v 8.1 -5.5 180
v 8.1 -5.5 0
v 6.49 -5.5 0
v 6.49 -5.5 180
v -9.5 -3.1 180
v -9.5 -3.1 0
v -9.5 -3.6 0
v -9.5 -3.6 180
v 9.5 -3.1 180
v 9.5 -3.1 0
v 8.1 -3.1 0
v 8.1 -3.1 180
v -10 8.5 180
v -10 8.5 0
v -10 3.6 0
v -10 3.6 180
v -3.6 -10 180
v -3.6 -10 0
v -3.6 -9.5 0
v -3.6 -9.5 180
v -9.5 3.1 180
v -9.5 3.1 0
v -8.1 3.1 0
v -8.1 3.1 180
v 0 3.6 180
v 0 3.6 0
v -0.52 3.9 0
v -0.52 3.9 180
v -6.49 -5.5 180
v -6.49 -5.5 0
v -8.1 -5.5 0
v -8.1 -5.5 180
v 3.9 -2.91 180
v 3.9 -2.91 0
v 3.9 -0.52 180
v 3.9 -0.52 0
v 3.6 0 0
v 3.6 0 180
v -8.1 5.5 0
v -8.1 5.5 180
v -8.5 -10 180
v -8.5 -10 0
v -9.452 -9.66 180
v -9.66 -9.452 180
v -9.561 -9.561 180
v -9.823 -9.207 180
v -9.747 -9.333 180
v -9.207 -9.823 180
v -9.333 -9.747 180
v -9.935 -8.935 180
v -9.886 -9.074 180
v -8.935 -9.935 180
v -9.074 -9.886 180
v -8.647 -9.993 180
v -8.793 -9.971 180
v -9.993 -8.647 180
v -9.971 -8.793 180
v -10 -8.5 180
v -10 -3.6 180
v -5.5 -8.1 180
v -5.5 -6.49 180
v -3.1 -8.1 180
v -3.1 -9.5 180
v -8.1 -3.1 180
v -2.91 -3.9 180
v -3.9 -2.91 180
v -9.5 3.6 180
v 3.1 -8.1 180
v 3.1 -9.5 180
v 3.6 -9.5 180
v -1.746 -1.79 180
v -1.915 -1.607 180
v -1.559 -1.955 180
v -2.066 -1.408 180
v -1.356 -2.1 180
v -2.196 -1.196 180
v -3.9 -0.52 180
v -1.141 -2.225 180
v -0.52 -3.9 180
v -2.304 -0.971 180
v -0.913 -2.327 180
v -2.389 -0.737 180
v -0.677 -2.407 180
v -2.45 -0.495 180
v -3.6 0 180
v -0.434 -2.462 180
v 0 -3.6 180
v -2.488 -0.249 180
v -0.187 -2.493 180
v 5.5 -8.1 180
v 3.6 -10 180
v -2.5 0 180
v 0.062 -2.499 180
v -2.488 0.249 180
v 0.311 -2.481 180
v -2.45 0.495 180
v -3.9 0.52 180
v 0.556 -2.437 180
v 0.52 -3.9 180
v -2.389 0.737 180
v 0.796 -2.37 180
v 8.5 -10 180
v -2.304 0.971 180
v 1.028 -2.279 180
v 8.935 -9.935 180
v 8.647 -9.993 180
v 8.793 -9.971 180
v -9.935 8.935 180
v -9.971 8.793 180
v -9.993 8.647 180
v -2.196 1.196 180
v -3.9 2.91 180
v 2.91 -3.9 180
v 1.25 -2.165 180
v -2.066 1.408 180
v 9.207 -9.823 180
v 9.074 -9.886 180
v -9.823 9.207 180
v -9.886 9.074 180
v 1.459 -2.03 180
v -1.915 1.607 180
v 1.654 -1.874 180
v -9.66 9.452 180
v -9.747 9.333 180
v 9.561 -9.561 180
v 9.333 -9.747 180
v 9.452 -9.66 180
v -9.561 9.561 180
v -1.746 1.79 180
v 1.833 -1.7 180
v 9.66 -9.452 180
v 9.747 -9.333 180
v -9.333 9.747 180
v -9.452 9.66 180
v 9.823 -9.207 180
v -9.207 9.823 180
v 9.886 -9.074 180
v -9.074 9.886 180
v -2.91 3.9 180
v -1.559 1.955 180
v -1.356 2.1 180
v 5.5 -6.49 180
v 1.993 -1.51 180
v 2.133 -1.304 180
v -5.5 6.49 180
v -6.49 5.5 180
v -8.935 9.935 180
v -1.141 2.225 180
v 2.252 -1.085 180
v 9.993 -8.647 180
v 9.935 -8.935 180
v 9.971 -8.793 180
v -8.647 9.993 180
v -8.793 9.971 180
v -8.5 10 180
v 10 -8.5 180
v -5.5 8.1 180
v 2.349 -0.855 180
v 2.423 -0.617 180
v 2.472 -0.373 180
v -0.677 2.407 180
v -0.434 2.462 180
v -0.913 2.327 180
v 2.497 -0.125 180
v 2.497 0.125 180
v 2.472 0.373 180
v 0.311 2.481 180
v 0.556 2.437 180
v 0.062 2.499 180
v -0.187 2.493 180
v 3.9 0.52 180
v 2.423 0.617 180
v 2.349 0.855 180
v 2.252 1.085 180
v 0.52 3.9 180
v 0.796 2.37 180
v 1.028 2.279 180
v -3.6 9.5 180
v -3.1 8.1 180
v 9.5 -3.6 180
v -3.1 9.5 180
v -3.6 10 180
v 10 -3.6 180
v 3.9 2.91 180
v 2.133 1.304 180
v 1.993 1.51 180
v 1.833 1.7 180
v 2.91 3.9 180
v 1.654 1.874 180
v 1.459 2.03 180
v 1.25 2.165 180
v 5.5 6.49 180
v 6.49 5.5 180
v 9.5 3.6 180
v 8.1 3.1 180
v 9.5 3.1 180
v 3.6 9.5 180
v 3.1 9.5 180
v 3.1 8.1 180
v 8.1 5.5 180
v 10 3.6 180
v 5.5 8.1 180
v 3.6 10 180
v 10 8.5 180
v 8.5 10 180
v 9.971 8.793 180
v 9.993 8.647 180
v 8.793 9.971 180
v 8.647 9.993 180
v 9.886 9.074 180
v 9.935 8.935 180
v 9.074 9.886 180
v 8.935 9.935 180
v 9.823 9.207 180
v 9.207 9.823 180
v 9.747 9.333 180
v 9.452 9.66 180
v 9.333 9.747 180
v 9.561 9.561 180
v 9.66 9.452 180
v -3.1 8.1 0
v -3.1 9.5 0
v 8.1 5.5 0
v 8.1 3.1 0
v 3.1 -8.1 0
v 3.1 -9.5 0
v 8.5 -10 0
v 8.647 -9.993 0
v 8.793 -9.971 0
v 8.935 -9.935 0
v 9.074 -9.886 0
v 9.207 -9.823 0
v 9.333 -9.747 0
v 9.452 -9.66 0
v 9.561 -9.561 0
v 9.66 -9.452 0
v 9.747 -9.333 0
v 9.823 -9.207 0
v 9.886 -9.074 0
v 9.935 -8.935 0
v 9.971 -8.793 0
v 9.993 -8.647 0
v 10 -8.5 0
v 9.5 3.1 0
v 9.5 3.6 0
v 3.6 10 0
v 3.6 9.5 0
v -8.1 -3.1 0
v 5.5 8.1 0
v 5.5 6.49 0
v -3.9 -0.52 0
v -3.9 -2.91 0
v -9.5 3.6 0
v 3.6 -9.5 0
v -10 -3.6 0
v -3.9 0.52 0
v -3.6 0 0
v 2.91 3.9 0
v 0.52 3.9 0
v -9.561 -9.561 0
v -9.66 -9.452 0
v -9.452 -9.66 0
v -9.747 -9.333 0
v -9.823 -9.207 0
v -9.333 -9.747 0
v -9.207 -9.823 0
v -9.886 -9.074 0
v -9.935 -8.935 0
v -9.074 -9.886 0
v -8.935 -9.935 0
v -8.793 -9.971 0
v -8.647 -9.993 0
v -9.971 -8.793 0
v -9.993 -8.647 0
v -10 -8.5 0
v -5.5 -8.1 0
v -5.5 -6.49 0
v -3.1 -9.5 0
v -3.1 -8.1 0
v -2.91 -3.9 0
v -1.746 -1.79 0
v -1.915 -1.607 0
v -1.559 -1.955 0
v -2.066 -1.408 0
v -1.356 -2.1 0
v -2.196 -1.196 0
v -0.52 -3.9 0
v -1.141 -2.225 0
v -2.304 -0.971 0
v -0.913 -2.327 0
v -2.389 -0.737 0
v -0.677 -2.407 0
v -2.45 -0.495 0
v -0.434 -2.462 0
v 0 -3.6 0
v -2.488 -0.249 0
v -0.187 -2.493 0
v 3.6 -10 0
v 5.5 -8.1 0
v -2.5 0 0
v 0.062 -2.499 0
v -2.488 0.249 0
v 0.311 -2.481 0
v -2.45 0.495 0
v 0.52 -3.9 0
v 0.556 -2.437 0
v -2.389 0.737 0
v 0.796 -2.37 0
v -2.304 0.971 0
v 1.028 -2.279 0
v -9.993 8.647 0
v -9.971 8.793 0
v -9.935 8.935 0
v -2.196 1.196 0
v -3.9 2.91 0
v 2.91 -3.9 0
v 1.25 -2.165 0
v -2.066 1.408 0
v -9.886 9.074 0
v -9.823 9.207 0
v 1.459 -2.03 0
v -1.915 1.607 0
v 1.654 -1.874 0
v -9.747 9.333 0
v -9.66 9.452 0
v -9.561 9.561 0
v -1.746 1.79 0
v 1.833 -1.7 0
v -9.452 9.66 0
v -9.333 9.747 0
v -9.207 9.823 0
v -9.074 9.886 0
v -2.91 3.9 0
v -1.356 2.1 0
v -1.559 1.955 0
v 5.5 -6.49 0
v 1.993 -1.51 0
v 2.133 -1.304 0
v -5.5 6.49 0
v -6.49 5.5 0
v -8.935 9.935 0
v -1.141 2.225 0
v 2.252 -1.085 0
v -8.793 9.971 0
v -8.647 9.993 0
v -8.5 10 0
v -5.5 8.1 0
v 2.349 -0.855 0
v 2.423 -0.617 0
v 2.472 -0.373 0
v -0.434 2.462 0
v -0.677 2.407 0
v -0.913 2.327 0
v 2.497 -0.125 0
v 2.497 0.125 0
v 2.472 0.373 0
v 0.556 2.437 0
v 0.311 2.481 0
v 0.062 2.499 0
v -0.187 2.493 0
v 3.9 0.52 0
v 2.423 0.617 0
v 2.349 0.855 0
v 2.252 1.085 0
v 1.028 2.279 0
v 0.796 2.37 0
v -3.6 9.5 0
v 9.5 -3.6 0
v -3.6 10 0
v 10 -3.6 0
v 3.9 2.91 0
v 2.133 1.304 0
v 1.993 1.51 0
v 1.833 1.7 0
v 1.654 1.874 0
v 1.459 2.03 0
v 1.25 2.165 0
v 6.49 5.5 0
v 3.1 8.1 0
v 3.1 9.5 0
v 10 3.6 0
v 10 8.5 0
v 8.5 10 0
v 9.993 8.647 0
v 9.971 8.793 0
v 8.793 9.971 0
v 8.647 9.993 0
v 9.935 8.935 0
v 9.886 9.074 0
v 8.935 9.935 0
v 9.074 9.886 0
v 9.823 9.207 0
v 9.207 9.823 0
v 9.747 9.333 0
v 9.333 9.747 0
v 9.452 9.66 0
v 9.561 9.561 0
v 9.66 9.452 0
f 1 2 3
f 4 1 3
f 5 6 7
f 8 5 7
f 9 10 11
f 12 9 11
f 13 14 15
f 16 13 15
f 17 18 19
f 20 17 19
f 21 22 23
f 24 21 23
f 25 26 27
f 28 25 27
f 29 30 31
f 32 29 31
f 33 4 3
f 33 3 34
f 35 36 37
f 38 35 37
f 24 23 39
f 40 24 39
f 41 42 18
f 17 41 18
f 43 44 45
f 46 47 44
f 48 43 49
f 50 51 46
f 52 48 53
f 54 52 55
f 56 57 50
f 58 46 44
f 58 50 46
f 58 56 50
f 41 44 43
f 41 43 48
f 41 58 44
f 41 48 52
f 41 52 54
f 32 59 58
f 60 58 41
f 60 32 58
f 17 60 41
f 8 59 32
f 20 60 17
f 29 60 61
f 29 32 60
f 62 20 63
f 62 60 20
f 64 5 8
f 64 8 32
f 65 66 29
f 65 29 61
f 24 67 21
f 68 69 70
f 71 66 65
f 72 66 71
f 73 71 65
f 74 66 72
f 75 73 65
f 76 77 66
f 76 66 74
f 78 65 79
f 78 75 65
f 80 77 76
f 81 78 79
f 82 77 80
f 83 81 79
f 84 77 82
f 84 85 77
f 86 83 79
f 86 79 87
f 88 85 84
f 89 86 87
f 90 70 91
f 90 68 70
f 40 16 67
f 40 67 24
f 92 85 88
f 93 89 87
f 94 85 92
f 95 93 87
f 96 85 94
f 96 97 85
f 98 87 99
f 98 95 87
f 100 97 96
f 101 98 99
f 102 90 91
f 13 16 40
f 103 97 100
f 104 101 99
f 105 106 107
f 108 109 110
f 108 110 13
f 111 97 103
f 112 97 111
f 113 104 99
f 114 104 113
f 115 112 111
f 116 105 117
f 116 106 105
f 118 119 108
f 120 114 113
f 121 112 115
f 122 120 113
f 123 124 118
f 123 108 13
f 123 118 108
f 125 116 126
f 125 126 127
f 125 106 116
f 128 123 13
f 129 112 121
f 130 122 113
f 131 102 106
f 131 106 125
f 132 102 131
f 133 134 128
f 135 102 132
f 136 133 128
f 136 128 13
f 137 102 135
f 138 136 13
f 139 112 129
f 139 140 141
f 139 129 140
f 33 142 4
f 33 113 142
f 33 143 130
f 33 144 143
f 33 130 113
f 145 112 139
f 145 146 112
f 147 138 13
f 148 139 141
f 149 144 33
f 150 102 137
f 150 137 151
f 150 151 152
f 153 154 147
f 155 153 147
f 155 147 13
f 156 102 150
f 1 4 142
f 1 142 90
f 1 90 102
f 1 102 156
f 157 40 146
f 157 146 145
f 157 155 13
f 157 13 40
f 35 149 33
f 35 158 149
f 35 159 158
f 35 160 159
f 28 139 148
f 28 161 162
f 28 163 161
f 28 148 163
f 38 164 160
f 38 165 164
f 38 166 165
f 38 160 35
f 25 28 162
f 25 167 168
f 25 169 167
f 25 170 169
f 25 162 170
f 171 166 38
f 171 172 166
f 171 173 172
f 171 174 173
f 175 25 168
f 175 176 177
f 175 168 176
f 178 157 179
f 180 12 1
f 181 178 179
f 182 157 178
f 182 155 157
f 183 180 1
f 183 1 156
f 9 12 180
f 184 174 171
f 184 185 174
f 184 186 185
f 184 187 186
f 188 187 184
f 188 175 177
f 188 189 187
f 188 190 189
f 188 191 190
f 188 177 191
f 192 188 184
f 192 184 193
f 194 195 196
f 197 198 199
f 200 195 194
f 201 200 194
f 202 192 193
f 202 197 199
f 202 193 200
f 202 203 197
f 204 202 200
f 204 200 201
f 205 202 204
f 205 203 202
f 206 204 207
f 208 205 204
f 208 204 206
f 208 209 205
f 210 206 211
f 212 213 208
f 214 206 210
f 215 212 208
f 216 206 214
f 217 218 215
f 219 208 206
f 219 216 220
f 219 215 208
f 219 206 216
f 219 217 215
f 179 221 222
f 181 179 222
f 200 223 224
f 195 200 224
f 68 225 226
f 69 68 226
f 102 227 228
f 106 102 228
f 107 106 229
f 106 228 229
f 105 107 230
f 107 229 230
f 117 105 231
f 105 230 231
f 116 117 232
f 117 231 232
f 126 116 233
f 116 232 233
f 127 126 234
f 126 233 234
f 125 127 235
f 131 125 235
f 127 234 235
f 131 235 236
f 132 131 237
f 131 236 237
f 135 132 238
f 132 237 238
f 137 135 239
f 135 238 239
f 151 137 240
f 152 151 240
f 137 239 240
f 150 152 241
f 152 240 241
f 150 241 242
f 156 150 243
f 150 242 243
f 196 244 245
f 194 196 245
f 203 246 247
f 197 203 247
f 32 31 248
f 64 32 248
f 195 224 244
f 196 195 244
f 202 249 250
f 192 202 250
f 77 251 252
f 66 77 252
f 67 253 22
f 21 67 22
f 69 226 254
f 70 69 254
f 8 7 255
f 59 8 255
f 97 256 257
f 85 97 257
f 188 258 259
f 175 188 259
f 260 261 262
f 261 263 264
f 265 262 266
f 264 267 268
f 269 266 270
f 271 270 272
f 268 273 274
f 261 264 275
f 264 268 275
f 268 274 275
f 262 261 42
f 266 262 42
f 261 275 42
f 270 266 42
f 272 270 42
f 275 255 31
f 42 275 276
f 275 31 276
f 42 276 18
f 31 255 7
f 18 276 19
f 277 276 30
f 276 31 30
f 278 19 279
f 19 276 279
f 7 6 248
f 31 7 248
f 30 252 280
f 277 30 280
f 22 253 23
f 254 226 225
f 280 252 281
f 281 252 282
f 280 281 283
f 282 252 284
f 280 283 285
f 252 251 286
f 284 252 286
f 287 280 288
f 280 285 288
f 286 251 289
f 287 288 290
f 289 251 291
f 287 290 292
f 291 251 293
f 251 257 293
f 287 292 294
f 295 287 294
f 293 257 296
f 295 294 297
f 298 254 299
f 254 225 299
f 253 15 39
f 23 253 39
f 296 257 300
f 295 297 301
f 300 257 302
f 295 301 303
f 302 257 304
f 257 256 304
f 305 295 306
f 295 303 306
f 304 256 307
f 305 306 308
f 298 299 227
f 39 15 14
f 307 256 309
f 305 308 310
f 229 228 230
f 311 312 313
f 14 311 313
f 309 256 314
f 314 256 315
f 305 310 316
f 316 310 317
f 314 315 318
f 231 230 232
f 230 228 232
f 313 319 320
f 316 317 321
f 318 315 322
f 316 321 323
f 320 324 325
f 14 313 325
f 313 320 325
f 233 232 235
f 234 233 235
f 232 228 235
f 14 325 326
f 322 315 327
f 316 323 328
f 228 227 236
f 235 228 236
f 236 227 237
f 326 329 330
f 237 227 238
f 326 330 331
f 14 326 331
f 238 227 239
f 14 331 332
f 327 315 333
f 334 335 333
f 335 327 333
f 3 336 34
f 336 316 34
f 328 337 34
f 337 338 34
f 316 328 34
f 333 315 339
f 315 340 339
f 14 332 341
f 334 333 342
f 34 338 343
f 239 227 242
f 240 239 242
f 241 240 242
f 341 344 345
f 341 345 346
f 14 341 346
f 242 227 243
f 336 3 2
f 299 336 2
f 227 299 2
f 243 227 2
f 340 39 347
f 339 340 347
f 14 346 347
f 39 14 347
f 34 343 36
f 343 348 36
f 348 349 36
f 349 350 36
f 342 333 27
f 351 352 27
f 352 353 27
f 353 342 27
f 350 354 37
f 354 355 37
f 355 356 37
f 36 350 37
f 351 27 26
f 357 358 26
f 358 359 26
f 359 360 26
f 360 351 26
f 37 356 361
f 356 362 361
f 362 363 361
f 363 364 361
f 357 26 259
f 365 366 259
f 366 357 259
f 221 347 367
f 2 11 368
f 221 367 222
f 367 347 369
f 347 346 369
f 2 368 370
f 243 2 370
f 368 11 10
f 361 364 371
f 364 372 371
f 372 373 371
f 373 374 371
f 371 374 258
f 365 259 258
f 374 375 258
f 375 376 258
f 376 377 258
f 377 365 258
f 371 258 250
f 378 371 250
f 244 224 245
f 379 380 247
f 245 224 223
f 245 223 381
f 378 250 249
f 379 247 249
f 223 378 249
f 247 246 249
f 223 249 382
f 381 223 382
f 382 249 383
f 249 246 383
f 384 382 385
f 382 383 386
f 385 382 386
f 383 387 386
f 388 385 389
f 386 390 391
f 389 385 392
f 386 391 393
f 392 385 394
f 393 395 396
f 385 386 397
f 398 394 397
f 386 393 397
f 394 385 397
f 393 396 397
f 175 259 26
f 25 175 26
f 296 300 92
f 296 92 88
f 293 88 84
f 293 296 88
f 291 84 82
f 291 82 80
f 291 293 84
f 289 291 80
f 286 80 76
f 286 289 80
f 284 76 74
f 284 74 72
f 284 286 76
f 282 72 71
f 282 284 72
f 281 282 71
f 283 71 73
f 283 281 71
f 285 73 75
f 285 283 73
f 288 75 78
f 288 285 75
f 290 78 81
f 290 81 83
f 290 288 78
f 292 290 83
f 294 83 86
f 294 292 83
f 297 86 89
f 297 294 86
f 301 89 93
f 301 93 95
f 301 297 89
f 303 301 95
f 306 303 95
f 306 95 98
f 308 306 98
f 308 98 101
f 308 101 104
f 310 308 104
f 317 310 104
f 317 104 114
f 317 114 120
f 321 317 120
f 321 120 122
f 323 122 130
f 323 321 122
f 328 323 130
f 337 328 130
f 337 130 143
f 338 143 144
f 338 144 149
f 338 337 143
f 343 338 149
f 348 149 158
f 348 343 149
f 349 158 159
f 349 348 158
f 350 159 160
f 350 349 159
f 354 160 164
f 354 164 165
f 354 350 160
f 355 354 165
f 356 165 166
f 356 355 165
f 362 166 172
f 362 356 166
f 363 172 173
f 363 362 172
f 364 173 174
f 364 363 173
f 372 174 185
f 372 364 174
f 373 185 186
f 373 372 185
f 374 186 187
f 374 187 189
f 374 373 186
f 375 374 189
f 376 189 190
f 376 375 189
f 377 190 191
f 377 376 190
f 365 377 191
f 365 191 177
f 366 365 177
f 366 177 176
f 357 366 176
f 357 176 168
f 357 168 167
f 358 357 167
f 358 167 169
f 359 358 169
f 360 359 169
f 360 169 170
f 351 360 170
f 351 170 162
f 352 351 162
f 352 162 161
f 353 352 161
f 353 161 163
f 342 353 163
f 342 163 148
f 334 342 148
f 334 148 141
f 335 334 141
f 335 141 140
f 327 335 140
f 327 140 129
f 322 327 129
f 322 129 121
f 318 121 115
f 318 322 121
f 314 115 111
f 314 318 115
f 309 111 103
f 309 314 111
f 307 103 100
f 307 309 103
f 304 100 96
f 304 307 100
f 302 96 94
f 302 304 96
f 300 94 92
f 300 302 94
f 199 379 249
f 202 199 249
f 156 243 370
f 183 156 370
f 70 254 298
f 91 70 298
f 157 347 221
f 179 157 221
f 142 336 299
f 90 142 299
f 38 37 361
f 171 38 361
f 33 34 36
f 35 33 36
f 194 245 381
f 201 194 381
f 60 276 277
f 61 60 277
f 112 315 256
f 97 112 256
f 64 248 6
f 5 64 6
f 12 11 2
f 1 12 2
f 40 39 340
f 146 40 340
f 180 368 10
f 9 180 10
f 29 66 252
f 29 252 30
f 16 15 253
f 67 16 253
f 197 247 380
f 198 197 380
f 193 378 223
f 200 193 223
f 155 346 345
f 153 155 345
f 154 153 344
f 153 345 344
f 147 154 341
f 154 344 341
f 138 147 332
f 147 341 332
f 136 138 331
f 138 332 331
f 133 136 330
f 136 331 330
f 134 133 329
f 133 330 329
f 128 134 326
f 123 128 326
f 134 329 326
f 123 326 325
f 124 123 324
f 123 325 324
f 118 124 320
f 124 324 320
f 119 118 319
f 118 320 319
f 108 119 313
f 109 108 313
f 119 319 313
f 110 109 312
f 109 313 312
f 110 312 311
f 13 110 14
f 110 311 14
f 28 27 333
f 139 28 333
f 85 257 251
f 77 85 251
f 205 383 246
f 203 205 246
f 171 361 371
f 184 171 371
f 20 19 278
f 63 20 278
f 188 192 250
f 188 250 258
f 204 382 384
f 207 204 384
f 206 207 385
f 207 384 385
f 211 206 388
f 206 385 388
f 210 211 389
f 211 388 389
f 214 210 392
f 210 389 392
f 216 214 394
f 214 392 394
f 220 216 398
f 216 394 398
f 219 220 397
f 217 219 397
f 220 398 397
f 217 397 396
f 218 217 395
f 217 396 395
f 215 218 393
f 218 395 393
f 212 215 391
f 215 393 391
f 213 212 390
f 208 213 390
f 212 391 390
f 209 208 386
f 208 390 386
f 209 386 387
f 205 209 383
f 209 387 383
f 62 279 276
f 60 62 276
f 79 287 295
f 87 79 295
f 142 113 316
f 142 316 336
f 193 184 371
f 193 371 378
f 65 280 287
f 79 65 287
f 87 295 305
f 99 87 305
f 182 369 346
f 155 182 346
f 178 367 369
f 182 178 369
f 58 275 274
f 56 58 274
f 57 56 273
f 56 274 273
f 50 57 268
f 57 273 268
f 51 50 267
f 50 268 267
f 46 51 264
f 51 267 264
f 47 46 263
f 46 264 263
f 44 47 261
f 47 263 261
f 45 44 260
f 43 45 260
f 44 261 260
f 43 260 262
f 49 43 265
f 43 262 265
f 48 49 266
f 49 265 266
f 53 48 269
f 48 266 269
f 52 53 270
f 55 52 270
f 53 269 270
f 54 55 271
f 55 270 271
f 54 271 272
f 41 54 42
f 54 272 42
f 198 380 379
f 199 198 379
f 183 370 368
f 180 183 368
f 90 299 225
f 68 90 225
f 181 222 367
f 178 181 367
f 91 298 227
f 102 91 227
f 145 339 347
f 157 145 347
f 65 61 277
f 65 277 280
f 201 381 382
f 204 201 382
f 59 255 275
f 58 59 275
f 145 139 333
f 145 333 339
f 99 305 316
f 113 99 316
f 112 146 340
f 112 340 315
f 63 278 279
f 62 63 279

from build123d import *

# Parameters (mm, degrees)
SKETCH_28_R     = 2.5
EXTRUDE_1_DEPTH = 180


with BuildPart() as part:
    # 草图28 → 凸台-拉伸1 (new body)
    with BuildSketch(Plane.XY):
        with BuildLine():
            Line((-3.9, -0.519615242), (-3.9, -2.910050506))
            Line((-3.9, -2.910050506), (-6.489949494, -5.5))
            Line((-6.489949494, -5.5), (-8.1, -5.5))
            Line((-8.1, -5.5), (-8.1, -3.1))
            Line((-8.1, -3.1), (-9.5, -3.1))
            Line((-9.5, -3.1), (-9.5, -3.6))
            Line((-9.5, -3.6), (-10, -3.6))
            Line((-10, -3.6), (-10, -8.5))
            ThreePointArc((-10, -8.5), (-9.560660172, -9.560660172), (-8.5, -10))
            Line((-8.5, -10), (-3.6, -10))
            Line((-3.6, -10), (-3.6, -9.5))
            Line((-3.6, -9.5), (-3.1, -9.5))
            Line((-3.1, -9.5), (-3.1, -8.1))
            Line((-3.1, -8.1), (-5.5, -8.1))
            Line((-5.5, -8.1), (-5.5, -6.489949494))
            Line((-5.5, -6.489949494), (-2.910050506, -3.9))
            Line((-2.910050506, -3.9), (-0.519615242, -3.9))
            Line((-0.519615242, -3.9), (0, -3.6))
            Line((0, -3.6), (0.519615242, -3.9))
            Line((0.519615242, -3.9), (2.910050506, -3.9))
            Line((2.910050506, -3.9), (5.5, -6.489949494))
            Line((5.5, -6.489949494), (5.5, -8.1))
            Line((5.5, -8.1), (3.1, -8.1))
            Line((3.1, -8.1), (3.1, -9.5))
            Line((3.1, -9.5), (3.6, -9.5))
            Line((3.6, -9.5), (3.6, -10))
            Line((3.6, -10), (8.5, -10))
            ThreePointArc((8.5, -10), (9.560660172, -9.560660172), (10, -8.5))
            Line((10, -8.5), (10, -3.6))
            Line((10, -3.6), (9.5, -3.6))
            Line((9.5, -3.6), (9.5, -3.1))
            Line((9.5, -3.1), (8.1, -3.1))
            Line((8.1, -3.1), (8.1, -5.5))
            Line((8.1, -5.5), (6.489949494, -5.5))
            Line((6.489949494, -5.5), (3.9, -2.910050506))
            Line((3.9, -2.910050506), (3.9, -0.519615242))
            Line((3.9, -0.519615242), (3.6, 0))
            Line((3.6, 0), (3.9, 0.519615242))
            Line((3.9, 0.519615242), (3.9, 2.910050506))
            Line((3.9, 2.910050506), (6.489949494, 5.5))
            Line((6.489949494, 5.5), (8.1, 5.5))
            Line((8.1, 5.5), (8.1, 3.1))
            Line((8.1, 3.1), (9.5, 3.1))
            Line((9.5, 3.1), (9.5, 3.6))
            Line((9.5, 3.6), (10, 3.6))
            Line((10, 3.6), (10, 8.5))
            ThreePointArc((10, 8.5), (9.560660172, 9.560660172), (8.5, 10))
            Line((8.5, 10), (3.6, 10))
            Line((3.6, 10), (3.6, 9.5))
            Line((3.6, 9.5), (3.1, 9.5))
            Line((3.1, 9.5), (3.1, 8.1))
            Line((3.1, 8.1), (5.5, 8.1))
            Line((5.5, 8.1), (5.5, 6.489949494))
            Line((5.5, 6.489949494), (2.910050506, 3.9))
            Line((2.910050506, 3.9), (0.519615242, 3.9))
            Line((0.519615242, 3.9), (0, 3.6))
            Line((0, 3.6), (-0.519615242, 3.9))
            Line((-0.519615242, 3.9), (-2.910050506, 3.9))
            Line((-2.910050506, 3.9), (-5.5, 6.489949494))
            Line((-5.5, 6.489949494), (-5.5, 8.1))
            Line((-5.5, 8.1), (-3.1, 8.1))
            Line((-3.1, 8.1), (-3.1, 9.5))
            Line((-3.1, 9.5), (-3.6, 9.5))
            Line((-3.6, 9.5), (-3.6, 10))
            Line((-3.6, 10), (-8.5, 10))
            ThreePointArc((-8.5, 10), (-9.560660172, 9.560660172), (-10, 8.5))
            Line((-10, 8.5), (-10, 3.6))
            Line((-10, 3.6), (-9.5, 3.6))
            Line((-9.5, 3.6), (-9.5, 3.1))
            Line((-9.5, 3.1), (-8.1, 3.1))
            Line((-8.1, 3.1), (-8.1, 5.5))
            Line((-8.1, 5.5), (-6.489949494, 5.5))
            Line((-6.489949494, 5.5), (-3.9, 2.910050506))
            Line((-3.9, 2.910050506), (-3.9, 0.519615242))
            Line((-3.9, 0.519615242), (-3.6, 0))
            Line((-3.6, 0), (-3.9, -0.519615242))
        make_face()
        with Locations(Location((0, 0, 0), (0, 0, 180))):
            Circle(SKETCH_28_R, mode=Mode.SUBTRACT)
    extrude(amount=EXTRUDE_1_DEPTH)


solid = part.part
